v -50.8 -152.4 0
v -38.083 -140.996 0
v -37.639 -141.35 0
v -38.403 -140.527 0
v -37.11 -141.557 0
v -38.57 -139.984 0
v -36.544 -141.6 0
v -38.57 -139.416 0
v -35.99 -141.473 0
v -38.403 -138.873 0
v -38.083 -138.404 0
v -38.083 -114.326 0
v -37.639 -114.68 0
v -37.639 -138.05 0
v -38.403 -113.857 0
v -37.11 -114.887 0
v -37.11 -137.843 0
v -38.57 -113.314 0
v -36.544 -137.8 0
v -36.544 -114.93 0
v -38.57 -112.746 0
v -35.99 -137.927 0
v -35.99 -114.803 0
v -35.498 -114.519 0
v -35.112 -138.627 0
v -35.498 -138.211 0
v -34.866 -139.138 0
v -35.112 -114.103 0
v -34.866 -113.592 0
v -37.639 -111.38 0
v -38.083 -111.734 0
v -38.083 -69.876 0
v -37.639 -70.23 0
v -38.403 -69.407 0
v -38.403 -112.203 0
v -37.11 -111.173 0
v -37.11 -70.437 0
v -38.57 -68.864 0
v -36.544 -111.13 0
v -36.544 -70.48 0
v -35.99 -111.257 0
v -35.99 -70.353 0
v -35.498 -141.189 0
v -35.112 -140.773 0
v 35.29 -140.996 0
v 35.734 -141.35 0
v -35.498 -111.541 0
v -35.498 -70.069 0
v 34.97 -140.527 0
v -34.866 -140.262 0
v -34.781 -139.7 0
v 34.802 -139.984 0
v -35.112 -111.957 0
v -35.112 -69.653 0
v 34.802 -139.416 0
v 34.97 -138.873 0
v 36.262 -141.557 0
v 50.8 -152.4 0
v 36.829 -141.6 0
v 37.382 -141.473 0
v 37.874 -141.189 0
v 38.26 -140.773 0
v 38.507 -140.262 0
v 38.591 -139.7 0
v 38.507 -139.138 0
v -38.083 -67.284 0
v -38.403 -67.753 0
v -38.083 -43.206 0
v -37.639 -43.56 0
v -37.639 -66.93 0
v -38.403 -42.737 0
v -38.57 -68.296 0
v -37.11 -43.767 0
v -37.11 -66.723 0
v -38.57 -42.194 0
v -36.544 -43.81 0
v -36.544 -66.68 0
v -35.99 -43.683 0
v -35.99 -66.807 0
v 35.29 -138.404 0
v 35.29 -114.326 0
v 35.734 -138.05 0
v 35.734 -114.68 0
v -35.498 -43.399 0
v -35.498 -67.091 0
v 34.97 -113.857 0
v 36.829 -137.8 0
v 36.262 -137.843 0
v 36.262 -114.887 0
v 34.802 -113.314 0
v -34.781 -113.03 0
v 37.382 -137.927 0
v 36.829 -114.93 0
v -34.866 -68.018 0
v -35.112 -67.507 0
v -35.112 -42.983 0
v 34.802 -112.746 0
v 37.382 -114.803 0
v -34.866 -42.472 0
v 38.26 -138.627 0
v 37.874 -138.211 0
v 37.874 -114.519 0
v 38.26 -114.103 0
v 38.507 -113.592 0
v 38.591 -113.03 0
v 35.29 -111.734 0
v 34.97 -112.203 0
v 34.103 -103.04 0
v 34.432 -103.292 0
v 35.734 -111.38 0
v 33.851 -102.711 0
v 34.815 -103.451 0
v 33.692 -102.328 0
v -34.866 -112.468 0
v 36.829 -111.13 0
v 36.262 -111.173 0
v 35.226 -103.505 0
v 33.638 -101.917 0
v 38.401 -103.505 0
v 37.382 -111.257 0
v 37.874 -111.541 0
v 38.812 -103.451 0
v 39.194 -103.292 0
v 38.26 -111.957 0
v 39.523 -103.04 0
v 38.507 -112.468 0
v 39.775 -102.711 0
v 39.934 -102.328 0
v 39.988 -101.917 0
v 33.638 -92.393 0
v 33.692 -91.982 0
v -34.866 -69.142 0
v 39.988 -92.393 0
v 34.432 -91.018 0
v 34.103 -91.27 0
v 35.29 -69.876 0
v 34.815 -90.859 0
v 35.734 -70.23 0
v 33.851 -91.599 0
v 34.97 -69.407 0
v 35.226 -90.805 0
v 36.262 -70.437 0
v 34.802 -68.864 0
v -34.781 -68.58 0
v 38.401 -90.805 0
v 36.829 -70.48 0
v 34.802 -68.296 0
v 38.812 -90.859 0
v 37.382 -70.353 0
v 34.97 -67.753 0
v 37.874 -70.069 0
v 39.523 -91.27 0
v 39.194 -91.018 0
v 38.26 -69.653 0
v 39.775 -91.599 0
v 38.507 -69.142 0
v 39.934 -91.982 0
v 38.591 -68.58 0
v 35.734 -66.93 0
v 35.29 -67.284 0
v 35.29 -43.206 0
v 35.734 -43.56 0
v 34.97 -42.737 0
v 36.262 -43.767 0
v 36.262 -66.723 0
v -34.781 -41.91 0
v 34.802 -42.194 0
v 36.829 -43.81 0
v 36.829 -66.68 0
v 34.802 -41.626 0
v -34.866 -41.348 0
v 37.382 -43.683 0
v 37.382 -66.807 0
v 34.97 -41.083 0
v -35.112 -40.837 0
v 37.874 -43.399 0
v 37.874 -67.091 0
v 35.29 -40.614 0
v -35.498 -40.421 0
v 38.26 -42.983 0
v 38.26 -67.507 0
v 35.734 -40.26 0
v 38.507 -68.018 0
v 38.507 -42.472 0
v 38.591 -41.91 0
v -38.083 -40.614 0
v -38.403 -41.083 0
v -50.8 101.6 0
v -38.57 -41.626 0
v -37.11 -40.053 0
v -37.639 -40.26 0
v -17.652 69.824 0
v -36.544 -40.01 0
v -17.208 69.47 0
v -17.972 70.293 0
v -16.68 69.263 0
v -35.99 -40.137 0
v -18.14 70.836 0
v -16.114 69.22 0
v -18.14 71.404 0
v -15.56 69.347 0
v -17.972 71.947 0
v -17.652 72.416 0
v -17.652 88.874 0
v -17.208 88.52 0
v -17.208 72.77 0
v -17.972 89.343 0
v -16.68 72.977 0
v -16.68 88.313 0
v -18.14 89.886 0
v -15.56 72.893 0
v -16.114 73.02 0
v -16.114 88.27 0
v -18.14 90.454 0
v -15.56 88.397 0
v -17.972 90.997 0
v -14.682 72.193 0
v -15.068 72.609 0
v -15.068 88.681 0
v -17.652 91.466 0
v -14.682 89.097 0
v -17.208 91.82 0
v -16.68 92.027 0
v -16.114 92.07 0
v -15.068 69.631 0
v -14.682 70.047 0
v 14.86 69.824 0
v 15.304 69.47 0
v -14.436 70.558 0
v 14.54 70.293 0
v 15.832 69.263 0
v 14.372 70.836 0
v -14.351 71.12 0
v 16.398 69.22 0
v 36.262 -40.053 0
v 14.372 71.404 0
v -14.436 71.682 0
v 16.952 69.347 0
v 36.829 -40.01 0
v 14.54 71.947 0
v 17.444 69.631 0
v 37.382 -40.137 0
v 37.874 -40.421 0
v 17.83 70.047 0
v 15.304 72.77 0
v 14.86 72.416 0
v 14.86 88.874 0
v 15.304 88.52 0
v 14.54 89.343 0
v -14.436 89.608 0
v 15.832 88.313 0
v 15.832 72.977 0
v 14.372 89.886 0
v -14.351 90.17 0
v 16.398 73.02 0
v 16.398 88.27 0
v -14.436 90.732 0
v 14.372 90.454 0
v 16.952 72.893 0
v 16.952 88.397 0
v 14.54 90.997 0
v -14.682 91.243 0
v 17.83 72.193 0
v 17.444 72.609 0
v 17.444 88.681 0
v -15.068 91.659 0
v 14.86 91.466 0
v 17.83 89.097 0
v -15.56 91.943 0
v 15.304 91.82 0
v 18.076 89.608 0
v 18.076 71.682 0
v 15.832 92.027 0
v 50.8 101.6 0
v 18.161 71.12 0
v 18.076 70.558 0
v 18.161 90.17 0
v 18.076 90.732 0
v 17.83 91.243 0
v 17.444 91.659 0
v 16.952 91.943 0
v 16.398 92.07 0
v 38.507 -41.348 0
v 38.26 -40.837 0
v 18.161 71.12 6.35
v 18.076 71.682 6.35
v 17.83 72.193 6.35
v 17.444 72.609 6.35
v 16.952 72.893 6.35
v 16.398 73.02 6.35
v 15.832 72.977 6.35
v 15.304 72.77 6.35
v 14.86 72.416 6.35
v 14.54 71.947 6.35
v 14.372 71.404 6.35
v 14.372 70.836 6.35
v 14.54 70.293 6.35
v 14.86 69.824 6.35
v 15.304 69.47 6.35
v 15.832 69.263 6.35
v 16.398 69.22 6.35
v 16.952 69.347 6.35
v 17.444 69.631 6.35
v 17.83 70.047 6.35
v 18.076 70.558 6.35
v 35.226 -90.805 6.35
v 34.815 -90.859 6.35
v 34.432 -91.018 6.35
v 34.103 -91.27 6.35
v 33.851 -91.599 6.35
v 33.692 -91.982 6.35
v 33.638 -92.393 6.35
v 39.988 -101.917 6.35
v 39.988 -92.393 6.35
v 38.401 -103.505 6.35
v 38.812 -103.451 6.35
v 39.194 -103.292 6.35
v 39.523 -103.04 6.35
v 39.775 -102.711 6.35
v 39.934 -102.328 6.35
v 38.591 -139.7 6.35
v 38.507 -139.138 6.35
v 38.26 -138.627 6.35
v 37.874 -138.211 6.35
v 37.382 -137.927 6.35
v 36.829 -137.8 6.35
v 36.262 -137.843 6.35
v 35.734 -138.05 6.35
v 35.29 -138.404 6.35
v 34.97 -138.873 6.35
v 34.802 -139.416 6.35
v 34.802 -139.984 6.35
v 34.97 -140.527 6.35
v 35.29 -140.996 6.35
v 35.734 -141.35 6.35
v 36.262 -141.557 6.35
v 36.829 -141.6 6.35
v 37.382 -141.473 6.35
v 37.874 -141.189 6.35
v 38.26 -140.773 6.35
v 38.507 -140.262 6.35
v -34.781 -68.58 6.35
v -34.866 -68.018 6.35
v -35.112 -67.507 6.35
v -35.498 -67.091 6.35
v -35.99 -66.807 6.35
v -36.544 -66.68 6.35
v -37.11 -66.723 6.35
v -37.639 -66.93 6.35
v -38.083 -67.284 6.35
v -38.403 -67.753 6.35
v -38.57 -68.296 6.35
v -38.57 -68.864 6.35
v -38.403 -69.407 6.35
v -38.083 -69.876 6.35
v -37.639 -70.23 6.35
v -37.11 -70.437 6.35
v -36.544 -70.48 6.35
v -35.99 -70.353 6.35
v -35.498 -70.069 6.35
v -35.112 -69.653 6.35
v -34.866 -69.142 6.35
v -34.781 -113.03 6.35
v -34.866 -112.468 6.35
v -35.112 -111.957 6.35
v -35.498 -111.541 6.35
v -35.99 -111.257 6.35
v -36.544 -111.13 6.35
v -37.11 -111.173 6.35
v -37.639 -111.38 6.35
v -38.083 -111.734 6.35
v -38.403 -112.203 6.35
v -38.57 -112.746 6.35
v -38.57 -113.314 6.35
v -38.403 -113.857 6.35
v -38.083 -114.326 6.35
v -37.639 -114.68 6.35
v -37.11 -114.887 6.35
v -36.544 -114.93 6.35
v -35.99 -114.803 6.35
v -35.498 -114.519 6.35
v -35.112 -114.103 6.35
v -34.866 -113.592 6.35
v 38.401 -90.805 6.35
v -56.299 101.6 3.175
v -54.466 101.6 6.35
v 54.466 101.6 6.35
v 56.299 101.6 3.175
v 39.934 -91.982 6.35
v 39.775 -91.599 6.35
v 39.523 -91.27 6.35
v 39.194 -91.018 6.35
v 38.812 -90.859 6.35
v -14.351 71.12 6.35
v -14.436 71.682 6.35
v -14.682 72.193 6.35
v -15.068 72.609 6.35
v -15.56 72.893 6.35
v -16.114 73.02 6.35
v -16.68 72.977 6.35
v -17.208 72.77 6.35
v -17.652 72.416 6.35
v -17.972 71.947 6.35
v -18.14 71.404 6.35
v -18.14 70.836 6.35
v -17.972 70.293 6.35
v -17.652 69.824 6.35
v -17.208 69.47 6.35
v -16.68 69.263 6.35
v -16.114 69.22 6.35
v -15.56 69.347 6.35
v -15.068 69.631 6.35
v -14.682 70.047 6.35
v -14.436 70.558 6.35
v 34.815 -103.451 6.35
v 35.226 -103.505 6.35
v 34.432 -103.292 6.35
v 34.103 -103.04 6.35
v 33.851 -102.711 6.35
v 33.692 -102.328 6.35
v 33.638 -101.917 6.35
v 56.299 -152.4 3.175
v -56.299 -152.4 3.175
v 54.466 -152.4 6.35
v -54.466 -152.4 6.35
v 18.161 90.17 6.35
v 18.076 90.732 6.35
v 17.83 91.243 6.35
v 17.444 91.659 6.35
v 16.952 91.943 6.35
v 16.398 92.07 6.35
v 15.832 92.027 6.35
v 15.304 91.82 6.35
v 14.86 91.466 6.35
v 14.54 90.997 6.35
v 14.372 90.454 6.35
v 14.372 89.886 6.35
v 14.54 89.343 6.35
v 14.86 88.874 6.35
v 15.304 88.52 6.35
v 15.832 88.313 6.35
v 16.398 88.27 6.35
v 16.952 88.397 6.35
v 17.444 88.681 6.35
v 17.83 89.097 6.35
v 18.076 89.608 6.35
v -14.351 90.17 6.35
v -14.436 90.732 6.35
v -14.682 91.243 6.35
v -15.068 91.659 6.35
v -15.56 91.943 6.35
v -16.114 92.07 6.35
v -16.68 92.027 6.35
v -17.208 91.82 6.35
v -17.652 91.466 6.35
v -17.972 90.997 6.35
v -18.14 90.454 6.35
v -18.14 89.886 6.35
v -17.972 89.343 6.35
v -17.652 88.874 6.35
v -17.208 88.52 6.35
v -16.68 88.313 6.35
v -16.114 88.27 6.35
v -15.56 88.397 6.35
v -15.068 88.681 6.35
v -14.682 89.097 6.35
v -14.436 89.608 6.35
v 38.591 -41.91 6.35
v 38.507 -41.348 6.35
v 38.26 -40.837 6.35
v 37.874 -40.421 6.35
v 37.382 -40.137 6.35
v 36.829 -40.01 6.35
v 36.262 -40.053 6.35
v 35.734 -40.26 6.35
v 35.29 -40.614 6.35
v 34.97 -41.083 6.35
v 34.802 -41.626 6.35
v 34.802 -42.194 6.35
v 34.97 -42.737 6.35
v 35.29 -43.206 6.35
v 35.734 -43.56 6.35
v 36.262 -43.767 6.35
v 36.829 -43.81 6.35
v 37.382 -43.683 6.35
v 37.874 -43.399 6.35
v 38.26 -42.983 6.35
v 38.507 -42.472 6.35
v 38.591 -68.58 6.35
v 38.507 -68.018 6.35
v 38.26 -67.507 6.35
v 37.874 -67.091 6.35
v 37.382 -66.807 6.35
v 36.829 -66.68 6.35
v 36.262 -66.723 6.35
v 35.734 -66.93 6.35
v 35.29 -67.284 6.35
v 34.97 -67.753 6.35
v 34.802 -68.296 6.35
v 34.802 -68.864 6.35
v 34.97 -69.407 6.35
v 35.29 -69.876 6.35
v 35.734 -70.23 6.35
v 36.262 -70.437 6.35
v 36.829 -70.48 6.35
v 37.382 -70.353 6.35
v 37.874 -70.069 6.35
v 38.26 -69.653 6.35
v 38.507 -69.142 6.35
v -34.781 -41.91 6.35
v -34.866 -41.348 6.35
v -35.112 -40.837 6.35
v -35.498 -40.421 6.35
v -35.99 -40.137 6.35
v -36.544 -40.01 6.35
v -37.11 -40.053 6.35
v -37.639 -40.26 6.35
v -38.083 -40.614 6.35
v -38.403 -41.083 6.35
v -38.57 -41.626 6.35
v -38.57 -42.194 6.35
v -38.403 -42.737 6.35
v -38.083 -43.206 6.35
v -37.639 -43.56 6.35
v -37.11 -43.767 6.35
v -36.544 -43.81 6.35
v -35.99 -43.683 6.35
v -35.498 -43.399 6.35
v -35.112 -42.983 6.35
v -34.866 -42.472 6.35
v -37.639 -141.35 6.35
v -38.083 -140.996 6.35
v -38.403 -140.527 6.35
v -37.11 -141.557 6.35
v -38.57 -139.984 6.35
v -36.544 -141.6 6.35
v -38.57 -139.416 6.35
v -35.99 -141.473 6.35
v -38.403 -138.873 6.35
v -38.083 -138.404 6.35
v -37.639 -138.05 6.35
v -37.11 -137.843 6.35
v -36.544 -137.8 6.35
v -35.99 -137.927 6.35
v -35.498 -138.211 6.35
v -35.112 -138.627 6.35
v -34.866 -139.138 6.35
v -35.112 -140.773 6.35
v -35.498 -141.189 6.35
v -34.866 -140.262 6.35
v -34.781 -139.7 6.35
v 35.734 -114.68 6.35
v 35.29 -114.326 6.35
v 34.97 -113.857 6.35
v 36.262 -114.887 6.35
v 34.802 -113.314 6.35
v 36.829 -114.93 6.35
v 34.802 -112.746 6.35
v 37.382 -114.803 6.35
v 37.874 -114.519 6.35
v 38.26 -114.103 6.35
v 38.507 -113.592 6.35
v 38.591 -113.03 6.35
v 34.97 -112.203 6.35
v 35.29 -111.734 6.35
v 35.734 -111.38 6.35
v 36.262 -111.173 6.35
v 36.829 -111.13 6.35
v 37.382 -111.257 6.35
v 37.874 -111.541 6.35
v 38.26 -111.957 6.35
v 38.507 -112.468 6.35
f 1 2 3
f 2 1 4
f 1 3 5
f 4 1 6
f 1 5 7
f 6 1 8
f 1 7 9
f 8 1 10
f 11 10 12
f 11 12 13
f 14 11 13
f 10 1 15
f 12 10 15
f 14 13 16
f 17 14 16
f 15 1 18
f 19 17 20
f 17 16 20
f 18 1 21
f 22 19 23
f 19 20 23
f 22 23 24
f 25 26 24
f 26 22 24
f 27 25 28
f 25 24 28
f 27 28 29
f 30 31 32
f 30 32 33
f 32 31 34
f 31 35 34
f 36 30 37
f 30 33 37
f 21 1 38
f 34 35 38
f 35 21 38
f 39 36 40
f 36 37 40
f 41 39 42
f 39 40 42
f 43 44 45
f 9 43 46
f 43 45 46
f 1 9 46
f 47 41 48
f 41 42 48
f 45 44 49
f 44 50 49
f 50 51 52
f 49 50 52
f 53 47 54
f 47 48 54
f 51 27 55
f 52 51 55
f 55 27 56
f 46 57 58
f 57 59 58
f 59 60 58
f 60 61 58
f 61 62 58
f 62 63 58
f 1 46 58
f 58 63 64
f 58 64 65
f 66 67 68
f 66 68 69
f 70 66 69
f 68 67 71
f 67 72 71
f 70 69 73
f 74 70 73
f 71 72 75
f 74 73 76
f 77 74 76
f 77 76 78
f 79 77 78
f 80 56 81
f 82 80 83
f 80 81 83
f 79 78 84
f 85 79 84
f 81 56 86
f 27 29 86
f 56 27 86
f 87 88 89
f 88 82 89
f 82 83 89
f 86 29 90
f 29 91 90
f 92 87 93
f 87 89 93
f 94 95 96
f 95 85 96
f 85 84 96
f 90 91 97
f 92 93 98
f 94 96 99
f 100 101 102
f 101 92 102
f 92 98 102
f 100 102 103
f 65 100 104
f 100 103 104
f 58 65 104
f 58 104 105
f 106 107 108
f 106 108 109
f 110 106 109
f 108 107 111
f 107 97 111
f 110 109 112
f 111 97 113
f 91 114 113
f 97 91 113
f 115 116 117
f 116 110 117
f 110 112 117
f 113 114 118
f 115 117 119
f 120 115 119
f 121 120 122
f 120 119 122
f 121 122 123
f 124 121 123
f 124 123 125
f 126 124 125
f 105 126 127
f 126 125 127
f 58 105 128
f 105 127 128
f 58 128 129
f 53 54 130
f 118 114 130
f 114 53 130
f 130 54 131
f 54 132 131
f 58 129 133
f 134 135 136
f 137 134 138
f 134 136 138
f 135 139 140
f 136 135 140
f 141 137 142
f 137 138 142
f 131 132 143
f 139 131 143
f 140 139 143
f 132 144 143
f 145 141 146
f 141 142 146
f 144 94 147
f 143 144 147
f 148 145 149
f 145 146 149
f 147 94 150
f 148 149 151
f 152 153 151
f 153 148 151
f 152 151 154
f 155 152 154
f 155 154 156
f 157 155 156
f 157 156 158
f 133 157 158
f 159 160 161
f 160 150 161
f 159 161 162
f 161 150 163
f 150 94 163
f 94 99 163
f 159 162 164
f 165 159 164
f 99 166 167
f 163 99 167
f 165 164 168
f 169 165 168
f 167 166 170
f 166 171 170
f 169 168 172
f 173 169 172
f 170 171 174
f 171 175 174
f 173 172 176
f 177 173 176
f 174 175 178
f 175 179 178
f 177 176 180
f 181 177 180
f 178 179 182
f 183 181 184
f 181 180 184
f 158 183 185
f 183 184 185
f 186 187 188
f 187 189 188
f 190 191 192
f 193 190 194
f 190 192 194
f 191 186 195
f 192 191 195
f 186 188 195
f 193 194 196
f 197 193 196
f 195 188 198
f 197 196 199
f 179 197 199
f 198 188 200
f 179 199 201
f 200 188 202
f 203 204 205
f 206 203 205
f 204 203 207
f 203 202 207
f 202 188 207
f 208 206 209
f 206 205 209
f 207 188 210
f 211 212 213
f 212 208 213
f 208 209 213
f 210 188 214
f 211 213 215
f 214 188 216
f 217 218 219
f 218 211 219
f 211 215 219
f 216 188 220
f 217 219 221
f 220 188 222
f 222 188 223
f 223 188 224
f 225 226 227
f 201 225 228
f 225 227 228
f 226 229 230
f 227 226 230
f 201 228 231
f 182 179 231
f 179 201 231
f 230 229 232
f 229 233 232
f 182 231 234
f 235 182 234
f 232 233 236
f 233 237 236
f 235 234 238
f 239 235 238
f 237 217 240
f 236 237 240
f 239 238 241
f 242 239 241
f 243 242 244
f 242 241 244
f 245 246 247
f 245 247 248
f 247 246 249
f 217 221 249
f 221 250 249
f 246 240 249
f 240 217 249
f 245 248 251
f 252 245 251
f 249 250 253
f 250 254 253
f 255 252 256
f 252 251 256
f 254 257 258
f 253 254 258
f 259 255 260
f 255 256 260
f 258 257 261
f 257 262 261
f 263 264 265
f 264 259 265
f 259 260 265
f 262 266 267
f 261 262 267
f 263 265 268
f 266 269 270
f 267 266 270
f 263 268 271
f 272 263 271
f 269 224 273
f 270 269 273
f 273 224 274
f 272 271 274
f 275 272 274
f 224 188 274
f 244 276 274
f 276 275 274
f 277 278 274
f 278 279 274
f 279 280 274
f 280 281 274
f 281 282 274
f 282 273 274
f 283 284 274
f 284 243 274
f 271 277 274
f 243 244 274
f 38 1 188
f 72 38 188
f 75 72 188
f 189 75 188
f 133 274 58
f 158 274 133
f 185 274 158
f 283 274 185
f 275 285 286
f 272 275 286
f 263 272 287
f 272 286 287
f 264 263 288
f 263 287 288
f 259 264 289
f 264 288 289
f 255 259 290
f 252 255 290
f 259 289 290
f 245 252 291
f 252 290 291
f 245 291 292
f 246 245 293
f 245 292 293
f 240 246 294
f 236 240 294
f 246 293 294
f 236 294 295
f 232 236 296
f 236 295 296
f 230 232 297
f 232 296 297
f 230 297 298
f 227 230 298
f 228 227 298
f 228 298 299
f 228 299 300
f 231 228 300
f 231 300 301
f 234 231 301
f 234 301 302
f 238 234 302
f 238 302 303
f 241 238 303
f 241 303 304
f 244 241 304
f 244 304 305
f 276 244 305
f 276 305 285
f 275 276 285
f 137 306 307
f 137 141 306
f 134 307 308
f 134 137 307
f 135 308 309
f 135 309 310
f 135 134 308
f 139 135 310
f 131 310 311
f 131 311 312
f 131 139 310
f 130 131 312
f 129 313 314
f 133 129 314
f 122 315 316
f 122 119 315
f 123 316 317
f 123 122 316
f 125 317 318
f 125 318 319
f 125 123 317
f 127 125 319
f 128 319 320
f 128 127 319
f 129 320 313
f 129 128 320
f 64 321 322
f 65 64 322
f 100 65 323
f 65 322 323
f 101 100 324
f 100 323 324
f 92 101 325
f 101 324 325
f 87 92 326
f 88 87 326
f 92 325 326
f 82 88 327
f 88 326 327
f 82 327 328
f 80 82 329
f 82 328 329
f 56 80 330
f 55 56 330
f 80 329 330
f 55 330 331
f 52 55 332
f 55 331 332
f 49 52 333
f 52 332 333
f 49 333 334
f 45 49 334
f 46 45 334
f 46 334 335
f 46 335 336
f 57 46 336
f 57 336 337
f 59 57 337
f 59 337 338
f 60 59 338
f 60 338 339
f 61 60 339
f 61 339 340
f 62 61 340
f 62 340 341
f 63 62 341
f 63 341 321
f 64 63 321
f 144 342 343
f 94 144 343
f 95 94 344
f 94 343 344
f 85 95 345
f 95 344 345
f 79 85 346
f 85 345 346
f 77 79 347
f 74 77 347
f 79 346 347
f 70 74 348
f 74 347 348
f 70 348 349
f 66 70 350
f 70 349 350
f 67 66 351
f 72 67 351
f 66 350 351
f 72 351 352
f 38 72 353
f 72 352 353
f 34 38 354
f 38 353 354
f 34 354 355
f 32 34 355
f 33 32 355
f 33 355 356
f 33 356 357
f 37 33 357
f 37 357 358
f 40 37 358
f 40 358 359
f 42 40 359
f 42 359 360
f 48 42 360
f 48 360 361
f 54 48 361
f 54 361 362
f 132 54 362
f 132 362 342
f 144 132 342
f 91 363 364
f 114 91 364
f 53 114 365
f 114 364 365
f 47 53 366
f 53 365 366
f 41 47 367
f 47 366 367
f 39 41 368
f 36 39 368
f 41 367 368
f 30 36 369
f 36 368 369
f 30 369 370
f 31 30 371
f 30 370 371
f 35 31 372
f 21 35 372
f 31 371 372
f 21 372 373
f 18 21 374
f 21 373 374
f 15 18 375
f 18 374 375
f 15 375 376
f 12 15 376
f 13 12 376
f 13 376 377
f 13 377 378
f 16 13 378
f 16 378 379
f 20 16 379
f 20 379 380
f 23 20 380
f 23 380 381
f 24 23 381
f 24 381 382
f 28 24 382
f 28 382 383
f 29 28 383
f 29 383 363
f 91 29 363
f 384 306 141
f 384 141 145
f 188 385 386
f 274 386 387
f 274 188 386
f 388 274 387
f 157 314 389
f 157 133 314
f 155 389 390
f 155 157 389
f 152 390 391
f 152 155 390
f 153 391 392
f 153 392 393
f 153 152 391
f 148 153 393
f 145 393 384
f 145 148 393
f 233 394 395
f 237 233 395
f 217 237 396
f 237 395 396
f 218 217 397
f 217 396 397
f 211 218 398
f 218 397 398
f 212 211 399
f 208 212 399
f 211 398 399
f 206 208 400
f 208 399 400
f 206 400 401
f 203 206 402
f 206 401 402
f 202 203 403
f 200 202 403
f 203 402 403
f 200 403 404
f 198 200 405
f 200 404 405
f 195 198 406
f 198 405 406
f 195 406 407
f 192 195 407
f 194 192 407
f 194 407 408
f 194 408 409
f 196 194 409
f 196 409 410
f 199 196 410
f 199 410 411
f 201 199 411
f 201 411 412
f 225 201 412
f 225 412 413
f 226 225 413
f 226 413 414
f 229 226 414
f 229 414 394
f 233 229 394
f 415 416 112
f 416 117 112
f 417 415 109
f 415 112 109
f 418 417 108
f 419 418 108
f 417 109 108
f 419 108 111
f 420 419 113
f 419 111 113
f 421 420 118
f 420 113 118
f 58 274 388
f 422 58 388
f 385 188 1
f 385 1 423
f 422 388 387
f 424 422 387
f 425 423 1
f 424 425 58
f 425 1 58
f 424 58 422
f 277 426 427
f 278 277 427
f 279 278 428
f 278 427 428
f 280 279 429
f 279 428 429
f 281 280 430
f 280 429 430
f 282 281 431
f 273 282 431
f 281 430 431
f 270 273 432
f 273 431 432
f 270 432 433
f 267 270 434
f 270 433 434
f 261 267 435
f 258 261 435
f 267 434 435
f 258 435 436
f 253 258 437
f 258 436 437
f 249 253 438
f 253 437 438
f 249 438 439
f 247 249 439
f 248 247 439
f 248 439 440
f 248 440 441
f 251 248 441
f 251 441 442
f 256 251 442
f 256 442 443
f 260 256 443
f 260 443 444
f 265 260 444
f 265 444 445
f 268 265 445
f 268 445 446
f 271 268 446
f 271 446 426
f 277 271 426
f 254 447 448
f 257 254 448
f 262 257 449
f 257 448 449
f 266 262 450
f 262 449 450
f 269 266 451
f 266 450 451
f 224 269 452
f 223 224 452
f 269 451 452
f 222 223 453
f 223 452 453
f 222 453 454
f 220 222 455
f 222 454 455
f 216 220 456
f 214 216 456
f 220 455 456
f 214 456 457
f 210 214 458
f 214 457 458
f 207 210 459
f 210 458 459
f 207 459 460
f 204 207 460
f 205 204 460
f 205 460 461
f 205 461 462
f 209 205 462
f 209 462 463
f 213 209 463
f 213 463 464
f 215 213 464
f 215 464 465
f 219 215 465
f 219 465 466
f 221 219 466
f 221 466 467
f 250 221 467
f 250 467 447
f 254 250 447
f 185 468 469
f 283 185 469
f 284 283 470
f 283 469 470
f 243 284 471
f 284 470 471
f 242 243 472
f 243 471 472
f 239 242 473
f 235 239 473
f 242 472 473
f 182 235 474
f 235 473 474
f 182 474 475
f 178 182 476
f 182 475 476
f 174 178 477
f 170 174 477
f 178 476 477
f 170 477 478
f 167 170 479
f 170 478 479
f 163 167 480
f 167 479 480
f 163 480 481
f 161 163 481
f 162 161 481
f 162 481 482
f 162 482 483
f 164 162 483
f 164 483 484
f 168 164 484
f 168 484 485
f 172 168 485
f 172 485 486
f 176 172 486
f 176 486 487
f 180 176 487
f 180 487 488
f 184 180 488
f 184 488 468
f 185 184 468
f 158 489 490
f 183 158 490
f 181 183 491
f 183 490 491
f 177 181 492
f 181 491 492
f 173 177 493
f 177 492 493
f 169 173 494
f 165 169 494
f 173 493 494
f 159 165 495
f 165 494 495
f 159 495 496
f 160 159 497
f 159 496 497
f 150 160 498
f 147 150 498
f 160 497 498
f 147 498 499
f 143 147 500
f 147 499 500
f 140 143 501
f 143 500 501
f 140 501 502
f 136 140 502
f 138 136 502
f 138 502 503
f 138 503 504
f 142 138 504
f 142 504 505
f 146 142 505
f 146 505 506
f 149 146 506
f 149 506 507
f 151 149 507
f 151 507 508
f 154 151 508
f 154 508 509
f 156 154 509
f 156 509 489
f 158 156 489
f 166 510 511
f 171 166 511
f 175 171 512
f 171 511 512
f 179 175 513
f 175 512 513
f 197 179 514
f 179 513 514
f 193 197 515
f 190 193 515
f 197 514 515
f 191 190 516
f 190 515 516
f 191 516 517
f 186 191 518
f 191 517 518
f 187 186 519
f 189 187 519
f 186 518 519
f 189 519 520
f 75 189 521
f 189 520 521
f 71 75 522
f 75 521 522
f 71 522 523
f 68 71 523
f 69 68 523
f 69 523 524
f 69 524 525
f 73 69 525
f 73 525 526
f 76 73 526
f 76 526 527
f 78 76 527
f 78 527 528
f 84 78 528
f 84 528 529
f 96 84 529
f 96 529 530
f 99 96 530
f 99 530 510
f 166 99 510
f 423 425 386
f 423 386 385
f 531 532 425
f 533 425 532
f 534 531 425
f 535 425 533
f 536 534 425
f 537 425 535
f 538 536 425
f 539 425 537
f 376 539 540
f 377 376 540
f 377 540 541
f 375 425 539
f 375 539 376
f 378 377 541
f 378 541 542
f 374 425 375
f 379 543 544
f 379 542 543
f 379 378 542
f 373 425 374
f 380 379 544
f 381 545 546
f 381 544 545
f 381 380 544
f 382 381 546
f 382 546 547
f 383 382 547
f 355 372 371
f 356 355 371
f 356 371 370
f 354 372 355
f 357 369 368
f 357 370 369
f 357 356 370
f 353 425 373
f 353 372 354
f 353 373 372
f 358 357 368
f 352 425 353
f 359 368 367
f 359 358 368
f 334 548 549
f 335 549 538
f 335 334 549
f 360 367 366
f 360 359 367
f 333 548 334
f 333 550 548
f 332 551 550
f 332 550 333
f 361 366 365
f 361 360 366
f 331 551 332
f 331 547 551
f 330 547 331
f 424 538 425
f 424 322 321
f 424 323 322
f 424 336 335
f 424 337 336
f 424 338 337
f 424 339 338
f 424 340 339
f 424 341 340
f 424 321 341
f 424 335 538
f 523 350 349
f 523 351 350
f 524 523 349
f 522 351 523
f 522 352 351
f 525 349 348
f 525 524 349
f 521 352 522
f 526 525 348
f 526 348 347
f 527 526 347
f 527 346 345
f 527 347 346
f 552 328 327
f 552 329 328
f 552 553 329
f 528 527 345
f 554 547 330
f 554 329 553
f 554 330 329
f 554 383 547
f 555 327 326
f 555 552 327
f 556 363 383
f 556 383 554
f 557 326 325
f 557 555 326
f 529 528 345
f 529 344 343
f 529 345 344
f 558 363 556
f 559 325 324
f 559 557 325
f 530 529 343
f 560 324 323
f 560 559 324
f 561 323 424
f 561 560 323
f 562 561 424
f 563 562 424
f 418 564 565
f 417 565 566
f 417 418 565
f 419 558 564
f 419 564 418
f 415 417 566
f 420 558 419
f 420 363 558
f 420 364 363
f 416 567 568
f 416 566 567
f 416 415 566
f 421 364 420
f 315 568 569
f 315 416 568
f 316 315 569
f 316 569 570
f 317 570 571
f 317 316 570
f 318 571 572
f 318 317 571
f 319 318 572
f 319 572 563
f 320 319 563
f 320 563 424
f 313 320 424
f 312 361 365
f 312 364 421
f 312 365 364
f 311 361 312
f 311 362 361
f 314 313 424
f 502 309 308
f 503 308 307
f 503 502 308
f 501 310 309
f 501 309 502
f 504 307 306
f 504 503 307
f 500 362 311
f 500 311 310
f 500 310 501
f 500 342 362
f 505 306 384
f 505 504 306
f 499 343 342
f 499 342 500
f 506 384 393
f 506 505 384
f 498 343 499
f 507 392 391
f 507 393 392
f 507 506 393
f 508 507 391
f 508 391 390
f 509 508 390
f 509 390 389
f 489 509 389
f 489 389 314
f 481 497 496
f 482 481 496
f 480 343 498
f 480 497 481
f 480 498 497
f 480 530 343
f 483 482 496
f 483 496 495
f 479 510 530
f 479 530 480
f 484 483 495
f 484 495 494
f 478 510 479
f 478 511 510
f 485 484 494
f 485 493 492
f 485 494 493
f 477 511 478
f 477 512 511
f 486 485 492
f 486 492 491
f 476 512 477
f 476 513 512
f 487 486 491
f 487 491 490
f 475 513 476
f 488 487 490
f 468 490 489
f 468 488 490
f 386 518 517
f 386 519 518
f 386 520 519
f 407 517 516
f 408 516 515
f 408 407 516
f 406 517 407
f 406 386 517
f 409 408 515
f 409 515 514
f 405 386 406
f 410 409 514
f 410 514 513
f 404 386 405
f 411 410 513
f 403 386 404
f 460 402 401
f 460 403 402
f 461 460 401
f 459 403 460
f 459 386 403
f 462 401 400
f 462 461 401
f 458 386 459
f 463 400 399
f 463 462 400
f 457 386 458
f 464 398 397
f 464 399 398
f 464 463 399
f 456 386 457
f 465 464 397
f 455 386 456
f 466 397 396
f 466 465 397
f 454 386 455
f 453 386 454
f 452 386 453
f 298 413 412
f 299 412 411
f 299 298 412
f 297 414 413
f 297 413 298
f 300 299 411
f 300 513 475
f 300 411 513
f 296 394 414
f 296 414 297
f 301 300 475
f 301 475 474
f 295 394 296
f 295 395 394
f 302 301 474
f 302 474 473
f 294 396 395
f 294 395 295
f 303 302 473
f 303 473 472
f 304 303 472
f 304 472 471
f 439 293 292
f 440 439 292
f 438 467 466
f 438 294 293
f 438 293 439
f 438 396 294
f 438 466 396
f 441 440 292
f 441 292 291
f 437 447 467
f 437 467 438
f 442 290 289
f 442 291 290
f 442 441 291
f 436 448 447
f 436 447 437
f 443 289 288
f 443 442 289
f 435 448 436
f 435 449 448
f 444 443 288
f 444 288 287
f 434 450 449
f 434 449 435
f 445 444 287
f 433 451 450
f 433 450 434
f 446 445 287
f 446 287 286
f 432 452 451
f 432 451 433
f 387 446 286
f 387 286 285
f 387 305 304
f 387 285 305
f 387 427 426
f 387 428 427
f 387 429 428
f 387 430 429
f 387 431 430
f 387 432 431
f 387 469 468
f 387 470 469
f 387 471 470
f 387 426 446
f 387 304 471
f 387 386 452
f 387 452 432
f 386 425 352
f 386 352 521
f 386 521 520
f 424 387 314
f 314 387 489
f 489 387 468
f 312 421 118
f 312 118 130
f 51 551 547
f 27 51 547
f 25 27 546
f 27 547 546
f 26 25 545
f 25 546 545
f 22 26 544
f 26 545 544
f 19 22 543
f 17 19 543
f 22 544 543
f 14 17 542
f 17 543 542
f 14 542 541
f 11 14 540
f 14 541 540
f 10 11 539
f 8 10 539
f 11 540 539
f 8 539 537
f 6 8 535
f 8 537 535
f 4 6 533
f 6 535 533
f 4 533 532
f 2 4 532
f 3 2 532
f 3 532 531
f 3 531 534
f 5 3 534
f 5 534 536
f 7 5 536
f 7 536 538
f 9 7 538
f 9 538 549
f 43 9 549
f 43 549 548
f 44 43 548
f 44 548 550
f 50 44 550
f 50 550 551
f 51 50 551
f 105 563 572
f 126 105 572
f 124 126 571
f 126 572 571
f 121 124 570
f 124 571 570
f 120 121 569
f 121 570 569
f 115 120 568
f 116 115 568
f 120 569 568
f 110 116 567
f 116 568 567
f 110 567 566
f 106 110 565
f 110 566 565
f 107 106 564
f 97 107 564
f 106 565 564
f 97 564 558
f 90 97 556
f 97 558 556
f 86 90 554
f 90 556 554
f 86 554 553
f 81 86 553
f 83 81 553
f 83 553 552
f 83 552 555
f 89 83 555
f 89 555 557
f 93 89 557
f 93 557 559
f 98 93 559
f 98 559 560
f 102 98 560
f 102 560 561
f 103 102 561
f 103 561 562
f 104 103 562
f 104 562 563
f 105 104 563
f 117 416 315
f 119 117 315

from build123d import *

# Parameters (mm, degrees)
SKETCH1_W           = 101.6
SKETCH1_H           = 254
BOSS_EXTRUDE1_DEPTH = 6.35
BOSS_EXTRUDE2_DEPTH = 254
CUT_EXTRUDE2_DEPTH  = 255
SKETCH5_R           = 1.905
CUT_EXTRUDE3_DEPTH  = 7.35
SKETCH6_R           = 1.905
CUT_EXTRUDE4_DEPTH  = 7.35
SKETCH9_W           = 6.35
SKETCH9_H           = 12.7
CUT_EXTRUDE5_DEPTH  = 7.35
FILLET1_R           = 1.5875


with BuildPart() as part:
    # Sketch1 → Boss-Extrude1 (new body)
    with BuildSketch(Plane.XY):
        with Locations((0, -25.4)):
            Rectangle(SKETCH1_W, SKETCH1_H)
    extrude(amount=BOSS_EXTRUDE1_DEPTH)

    # Sketch2 → Boss-Extrude2 (add)
    with BuildSketch(Plane(origin=(0, 101.6, 0), x_dir=(1, 0, 0), z_dir=(0, 1, 0))):
        Polygon((-50.8, 0), (-61.798522628, -6.35), (-50.8, -6.35), align=None)
        Polygon((61.798522628, -6.35), (50.8, -6.35), (50.8, 0), align=None)
    extrude(amount=-BOSS_EXTRUDE2_DEPTH)

    # Sketch4 → Cut-Extrude2 (cut, through all)
    with BuildSketch(Plane(origin=(0, 101.6, 0), x_dir=(1, 0, 0), z_dir=(0, 1, 0))):
        Polygon((56.299261314, -3.175), (54.466174209, -6.35), (61.798522628, -6.35), align=None)
        Polygon((-61.798522628, -6.35), (-54.466174209, -6.35), (-56.299261314, -3.175), align=None)
    extrude(amount=-CUT_EXTRUDE2_DEPTH, mode=Mode.SUBTRACT)

    # Sketch5 → Cut-Extrude3 (cut, through all)
    with BuildSketch(Plane.XY.offset(6.35)):
        with Locations((-36.686174209, -41.91)):
            Circle(SKETCH5_R)
        with Locations((36.686174209, -41.91)):
            Circle(SKETCH5_R)
        with Locations((36.686174209, -68.58)):
            Circle(SKETCH5_R)
        with Locations((36.686174209, -113.03)):
            Circle(SKETCH5_R)
        with Locations((36.686174209, -139.7)):
            Circle(SKETCH5_R)
        with Locations((-36.686174209, -139.7)):
            Circle(SKETCH5_R)
        with Locations((-36.686174209, -113.03)):
            Circle(SKETCH5_R)
        with Locations((-36.686174209, -68.58)):
            Circle(SKETCH5_R)
    extrude(amount=-CUT_EXTRUDE3_DEPTH, mode=Mode.SUBTRACT)

    # Sketch6 → Cut-Extrude4 (cut, through all)
    with BuildSketch(Plane.XY.offset(6.35)):
        with Locations((-16.256, 90.17)):
            Circle(SKETCH6_R)
        with Locations((16.256, 90.17)):
            Circle(SKETCH6_R)
        with Locations((16.256, 71.12)):
            Circle(SKETCH6_R)
        with Locations((-16.256, 71.12)):
            Circle(SKETCH6_R)
    extrude(amount=-CUT_EXTRUDE4_DEPTH, mode=Mode.SUBTRACT)

    # Sketch9 → Cut-Extrude5 (cut, through all)
    with BuildSketch(Plane.XY.offset(6.35)):
        with Locations((36.813174209, -97.155)):
            Rectangle(SKETCH9_W, SKETCH9_H)
    extrude(amount=-CUT_EXTRUDE5_DEPTH, mode=Mode.SUBTRACT)

    # Fillet1
    fillet1_edges = [part.edges().sort_by_distance(p)[0] for p in [
        (33.638174209, -90.805, 3.175),
        (39.988174209, -90.805, 3.175),
        (39.988174209, -103.505, 3.175),
        (33.638174209, -103.505, 3.175),
    ]]
    fillet(fillet1_edges, radius=FILLET1_R)


solid = part.part
